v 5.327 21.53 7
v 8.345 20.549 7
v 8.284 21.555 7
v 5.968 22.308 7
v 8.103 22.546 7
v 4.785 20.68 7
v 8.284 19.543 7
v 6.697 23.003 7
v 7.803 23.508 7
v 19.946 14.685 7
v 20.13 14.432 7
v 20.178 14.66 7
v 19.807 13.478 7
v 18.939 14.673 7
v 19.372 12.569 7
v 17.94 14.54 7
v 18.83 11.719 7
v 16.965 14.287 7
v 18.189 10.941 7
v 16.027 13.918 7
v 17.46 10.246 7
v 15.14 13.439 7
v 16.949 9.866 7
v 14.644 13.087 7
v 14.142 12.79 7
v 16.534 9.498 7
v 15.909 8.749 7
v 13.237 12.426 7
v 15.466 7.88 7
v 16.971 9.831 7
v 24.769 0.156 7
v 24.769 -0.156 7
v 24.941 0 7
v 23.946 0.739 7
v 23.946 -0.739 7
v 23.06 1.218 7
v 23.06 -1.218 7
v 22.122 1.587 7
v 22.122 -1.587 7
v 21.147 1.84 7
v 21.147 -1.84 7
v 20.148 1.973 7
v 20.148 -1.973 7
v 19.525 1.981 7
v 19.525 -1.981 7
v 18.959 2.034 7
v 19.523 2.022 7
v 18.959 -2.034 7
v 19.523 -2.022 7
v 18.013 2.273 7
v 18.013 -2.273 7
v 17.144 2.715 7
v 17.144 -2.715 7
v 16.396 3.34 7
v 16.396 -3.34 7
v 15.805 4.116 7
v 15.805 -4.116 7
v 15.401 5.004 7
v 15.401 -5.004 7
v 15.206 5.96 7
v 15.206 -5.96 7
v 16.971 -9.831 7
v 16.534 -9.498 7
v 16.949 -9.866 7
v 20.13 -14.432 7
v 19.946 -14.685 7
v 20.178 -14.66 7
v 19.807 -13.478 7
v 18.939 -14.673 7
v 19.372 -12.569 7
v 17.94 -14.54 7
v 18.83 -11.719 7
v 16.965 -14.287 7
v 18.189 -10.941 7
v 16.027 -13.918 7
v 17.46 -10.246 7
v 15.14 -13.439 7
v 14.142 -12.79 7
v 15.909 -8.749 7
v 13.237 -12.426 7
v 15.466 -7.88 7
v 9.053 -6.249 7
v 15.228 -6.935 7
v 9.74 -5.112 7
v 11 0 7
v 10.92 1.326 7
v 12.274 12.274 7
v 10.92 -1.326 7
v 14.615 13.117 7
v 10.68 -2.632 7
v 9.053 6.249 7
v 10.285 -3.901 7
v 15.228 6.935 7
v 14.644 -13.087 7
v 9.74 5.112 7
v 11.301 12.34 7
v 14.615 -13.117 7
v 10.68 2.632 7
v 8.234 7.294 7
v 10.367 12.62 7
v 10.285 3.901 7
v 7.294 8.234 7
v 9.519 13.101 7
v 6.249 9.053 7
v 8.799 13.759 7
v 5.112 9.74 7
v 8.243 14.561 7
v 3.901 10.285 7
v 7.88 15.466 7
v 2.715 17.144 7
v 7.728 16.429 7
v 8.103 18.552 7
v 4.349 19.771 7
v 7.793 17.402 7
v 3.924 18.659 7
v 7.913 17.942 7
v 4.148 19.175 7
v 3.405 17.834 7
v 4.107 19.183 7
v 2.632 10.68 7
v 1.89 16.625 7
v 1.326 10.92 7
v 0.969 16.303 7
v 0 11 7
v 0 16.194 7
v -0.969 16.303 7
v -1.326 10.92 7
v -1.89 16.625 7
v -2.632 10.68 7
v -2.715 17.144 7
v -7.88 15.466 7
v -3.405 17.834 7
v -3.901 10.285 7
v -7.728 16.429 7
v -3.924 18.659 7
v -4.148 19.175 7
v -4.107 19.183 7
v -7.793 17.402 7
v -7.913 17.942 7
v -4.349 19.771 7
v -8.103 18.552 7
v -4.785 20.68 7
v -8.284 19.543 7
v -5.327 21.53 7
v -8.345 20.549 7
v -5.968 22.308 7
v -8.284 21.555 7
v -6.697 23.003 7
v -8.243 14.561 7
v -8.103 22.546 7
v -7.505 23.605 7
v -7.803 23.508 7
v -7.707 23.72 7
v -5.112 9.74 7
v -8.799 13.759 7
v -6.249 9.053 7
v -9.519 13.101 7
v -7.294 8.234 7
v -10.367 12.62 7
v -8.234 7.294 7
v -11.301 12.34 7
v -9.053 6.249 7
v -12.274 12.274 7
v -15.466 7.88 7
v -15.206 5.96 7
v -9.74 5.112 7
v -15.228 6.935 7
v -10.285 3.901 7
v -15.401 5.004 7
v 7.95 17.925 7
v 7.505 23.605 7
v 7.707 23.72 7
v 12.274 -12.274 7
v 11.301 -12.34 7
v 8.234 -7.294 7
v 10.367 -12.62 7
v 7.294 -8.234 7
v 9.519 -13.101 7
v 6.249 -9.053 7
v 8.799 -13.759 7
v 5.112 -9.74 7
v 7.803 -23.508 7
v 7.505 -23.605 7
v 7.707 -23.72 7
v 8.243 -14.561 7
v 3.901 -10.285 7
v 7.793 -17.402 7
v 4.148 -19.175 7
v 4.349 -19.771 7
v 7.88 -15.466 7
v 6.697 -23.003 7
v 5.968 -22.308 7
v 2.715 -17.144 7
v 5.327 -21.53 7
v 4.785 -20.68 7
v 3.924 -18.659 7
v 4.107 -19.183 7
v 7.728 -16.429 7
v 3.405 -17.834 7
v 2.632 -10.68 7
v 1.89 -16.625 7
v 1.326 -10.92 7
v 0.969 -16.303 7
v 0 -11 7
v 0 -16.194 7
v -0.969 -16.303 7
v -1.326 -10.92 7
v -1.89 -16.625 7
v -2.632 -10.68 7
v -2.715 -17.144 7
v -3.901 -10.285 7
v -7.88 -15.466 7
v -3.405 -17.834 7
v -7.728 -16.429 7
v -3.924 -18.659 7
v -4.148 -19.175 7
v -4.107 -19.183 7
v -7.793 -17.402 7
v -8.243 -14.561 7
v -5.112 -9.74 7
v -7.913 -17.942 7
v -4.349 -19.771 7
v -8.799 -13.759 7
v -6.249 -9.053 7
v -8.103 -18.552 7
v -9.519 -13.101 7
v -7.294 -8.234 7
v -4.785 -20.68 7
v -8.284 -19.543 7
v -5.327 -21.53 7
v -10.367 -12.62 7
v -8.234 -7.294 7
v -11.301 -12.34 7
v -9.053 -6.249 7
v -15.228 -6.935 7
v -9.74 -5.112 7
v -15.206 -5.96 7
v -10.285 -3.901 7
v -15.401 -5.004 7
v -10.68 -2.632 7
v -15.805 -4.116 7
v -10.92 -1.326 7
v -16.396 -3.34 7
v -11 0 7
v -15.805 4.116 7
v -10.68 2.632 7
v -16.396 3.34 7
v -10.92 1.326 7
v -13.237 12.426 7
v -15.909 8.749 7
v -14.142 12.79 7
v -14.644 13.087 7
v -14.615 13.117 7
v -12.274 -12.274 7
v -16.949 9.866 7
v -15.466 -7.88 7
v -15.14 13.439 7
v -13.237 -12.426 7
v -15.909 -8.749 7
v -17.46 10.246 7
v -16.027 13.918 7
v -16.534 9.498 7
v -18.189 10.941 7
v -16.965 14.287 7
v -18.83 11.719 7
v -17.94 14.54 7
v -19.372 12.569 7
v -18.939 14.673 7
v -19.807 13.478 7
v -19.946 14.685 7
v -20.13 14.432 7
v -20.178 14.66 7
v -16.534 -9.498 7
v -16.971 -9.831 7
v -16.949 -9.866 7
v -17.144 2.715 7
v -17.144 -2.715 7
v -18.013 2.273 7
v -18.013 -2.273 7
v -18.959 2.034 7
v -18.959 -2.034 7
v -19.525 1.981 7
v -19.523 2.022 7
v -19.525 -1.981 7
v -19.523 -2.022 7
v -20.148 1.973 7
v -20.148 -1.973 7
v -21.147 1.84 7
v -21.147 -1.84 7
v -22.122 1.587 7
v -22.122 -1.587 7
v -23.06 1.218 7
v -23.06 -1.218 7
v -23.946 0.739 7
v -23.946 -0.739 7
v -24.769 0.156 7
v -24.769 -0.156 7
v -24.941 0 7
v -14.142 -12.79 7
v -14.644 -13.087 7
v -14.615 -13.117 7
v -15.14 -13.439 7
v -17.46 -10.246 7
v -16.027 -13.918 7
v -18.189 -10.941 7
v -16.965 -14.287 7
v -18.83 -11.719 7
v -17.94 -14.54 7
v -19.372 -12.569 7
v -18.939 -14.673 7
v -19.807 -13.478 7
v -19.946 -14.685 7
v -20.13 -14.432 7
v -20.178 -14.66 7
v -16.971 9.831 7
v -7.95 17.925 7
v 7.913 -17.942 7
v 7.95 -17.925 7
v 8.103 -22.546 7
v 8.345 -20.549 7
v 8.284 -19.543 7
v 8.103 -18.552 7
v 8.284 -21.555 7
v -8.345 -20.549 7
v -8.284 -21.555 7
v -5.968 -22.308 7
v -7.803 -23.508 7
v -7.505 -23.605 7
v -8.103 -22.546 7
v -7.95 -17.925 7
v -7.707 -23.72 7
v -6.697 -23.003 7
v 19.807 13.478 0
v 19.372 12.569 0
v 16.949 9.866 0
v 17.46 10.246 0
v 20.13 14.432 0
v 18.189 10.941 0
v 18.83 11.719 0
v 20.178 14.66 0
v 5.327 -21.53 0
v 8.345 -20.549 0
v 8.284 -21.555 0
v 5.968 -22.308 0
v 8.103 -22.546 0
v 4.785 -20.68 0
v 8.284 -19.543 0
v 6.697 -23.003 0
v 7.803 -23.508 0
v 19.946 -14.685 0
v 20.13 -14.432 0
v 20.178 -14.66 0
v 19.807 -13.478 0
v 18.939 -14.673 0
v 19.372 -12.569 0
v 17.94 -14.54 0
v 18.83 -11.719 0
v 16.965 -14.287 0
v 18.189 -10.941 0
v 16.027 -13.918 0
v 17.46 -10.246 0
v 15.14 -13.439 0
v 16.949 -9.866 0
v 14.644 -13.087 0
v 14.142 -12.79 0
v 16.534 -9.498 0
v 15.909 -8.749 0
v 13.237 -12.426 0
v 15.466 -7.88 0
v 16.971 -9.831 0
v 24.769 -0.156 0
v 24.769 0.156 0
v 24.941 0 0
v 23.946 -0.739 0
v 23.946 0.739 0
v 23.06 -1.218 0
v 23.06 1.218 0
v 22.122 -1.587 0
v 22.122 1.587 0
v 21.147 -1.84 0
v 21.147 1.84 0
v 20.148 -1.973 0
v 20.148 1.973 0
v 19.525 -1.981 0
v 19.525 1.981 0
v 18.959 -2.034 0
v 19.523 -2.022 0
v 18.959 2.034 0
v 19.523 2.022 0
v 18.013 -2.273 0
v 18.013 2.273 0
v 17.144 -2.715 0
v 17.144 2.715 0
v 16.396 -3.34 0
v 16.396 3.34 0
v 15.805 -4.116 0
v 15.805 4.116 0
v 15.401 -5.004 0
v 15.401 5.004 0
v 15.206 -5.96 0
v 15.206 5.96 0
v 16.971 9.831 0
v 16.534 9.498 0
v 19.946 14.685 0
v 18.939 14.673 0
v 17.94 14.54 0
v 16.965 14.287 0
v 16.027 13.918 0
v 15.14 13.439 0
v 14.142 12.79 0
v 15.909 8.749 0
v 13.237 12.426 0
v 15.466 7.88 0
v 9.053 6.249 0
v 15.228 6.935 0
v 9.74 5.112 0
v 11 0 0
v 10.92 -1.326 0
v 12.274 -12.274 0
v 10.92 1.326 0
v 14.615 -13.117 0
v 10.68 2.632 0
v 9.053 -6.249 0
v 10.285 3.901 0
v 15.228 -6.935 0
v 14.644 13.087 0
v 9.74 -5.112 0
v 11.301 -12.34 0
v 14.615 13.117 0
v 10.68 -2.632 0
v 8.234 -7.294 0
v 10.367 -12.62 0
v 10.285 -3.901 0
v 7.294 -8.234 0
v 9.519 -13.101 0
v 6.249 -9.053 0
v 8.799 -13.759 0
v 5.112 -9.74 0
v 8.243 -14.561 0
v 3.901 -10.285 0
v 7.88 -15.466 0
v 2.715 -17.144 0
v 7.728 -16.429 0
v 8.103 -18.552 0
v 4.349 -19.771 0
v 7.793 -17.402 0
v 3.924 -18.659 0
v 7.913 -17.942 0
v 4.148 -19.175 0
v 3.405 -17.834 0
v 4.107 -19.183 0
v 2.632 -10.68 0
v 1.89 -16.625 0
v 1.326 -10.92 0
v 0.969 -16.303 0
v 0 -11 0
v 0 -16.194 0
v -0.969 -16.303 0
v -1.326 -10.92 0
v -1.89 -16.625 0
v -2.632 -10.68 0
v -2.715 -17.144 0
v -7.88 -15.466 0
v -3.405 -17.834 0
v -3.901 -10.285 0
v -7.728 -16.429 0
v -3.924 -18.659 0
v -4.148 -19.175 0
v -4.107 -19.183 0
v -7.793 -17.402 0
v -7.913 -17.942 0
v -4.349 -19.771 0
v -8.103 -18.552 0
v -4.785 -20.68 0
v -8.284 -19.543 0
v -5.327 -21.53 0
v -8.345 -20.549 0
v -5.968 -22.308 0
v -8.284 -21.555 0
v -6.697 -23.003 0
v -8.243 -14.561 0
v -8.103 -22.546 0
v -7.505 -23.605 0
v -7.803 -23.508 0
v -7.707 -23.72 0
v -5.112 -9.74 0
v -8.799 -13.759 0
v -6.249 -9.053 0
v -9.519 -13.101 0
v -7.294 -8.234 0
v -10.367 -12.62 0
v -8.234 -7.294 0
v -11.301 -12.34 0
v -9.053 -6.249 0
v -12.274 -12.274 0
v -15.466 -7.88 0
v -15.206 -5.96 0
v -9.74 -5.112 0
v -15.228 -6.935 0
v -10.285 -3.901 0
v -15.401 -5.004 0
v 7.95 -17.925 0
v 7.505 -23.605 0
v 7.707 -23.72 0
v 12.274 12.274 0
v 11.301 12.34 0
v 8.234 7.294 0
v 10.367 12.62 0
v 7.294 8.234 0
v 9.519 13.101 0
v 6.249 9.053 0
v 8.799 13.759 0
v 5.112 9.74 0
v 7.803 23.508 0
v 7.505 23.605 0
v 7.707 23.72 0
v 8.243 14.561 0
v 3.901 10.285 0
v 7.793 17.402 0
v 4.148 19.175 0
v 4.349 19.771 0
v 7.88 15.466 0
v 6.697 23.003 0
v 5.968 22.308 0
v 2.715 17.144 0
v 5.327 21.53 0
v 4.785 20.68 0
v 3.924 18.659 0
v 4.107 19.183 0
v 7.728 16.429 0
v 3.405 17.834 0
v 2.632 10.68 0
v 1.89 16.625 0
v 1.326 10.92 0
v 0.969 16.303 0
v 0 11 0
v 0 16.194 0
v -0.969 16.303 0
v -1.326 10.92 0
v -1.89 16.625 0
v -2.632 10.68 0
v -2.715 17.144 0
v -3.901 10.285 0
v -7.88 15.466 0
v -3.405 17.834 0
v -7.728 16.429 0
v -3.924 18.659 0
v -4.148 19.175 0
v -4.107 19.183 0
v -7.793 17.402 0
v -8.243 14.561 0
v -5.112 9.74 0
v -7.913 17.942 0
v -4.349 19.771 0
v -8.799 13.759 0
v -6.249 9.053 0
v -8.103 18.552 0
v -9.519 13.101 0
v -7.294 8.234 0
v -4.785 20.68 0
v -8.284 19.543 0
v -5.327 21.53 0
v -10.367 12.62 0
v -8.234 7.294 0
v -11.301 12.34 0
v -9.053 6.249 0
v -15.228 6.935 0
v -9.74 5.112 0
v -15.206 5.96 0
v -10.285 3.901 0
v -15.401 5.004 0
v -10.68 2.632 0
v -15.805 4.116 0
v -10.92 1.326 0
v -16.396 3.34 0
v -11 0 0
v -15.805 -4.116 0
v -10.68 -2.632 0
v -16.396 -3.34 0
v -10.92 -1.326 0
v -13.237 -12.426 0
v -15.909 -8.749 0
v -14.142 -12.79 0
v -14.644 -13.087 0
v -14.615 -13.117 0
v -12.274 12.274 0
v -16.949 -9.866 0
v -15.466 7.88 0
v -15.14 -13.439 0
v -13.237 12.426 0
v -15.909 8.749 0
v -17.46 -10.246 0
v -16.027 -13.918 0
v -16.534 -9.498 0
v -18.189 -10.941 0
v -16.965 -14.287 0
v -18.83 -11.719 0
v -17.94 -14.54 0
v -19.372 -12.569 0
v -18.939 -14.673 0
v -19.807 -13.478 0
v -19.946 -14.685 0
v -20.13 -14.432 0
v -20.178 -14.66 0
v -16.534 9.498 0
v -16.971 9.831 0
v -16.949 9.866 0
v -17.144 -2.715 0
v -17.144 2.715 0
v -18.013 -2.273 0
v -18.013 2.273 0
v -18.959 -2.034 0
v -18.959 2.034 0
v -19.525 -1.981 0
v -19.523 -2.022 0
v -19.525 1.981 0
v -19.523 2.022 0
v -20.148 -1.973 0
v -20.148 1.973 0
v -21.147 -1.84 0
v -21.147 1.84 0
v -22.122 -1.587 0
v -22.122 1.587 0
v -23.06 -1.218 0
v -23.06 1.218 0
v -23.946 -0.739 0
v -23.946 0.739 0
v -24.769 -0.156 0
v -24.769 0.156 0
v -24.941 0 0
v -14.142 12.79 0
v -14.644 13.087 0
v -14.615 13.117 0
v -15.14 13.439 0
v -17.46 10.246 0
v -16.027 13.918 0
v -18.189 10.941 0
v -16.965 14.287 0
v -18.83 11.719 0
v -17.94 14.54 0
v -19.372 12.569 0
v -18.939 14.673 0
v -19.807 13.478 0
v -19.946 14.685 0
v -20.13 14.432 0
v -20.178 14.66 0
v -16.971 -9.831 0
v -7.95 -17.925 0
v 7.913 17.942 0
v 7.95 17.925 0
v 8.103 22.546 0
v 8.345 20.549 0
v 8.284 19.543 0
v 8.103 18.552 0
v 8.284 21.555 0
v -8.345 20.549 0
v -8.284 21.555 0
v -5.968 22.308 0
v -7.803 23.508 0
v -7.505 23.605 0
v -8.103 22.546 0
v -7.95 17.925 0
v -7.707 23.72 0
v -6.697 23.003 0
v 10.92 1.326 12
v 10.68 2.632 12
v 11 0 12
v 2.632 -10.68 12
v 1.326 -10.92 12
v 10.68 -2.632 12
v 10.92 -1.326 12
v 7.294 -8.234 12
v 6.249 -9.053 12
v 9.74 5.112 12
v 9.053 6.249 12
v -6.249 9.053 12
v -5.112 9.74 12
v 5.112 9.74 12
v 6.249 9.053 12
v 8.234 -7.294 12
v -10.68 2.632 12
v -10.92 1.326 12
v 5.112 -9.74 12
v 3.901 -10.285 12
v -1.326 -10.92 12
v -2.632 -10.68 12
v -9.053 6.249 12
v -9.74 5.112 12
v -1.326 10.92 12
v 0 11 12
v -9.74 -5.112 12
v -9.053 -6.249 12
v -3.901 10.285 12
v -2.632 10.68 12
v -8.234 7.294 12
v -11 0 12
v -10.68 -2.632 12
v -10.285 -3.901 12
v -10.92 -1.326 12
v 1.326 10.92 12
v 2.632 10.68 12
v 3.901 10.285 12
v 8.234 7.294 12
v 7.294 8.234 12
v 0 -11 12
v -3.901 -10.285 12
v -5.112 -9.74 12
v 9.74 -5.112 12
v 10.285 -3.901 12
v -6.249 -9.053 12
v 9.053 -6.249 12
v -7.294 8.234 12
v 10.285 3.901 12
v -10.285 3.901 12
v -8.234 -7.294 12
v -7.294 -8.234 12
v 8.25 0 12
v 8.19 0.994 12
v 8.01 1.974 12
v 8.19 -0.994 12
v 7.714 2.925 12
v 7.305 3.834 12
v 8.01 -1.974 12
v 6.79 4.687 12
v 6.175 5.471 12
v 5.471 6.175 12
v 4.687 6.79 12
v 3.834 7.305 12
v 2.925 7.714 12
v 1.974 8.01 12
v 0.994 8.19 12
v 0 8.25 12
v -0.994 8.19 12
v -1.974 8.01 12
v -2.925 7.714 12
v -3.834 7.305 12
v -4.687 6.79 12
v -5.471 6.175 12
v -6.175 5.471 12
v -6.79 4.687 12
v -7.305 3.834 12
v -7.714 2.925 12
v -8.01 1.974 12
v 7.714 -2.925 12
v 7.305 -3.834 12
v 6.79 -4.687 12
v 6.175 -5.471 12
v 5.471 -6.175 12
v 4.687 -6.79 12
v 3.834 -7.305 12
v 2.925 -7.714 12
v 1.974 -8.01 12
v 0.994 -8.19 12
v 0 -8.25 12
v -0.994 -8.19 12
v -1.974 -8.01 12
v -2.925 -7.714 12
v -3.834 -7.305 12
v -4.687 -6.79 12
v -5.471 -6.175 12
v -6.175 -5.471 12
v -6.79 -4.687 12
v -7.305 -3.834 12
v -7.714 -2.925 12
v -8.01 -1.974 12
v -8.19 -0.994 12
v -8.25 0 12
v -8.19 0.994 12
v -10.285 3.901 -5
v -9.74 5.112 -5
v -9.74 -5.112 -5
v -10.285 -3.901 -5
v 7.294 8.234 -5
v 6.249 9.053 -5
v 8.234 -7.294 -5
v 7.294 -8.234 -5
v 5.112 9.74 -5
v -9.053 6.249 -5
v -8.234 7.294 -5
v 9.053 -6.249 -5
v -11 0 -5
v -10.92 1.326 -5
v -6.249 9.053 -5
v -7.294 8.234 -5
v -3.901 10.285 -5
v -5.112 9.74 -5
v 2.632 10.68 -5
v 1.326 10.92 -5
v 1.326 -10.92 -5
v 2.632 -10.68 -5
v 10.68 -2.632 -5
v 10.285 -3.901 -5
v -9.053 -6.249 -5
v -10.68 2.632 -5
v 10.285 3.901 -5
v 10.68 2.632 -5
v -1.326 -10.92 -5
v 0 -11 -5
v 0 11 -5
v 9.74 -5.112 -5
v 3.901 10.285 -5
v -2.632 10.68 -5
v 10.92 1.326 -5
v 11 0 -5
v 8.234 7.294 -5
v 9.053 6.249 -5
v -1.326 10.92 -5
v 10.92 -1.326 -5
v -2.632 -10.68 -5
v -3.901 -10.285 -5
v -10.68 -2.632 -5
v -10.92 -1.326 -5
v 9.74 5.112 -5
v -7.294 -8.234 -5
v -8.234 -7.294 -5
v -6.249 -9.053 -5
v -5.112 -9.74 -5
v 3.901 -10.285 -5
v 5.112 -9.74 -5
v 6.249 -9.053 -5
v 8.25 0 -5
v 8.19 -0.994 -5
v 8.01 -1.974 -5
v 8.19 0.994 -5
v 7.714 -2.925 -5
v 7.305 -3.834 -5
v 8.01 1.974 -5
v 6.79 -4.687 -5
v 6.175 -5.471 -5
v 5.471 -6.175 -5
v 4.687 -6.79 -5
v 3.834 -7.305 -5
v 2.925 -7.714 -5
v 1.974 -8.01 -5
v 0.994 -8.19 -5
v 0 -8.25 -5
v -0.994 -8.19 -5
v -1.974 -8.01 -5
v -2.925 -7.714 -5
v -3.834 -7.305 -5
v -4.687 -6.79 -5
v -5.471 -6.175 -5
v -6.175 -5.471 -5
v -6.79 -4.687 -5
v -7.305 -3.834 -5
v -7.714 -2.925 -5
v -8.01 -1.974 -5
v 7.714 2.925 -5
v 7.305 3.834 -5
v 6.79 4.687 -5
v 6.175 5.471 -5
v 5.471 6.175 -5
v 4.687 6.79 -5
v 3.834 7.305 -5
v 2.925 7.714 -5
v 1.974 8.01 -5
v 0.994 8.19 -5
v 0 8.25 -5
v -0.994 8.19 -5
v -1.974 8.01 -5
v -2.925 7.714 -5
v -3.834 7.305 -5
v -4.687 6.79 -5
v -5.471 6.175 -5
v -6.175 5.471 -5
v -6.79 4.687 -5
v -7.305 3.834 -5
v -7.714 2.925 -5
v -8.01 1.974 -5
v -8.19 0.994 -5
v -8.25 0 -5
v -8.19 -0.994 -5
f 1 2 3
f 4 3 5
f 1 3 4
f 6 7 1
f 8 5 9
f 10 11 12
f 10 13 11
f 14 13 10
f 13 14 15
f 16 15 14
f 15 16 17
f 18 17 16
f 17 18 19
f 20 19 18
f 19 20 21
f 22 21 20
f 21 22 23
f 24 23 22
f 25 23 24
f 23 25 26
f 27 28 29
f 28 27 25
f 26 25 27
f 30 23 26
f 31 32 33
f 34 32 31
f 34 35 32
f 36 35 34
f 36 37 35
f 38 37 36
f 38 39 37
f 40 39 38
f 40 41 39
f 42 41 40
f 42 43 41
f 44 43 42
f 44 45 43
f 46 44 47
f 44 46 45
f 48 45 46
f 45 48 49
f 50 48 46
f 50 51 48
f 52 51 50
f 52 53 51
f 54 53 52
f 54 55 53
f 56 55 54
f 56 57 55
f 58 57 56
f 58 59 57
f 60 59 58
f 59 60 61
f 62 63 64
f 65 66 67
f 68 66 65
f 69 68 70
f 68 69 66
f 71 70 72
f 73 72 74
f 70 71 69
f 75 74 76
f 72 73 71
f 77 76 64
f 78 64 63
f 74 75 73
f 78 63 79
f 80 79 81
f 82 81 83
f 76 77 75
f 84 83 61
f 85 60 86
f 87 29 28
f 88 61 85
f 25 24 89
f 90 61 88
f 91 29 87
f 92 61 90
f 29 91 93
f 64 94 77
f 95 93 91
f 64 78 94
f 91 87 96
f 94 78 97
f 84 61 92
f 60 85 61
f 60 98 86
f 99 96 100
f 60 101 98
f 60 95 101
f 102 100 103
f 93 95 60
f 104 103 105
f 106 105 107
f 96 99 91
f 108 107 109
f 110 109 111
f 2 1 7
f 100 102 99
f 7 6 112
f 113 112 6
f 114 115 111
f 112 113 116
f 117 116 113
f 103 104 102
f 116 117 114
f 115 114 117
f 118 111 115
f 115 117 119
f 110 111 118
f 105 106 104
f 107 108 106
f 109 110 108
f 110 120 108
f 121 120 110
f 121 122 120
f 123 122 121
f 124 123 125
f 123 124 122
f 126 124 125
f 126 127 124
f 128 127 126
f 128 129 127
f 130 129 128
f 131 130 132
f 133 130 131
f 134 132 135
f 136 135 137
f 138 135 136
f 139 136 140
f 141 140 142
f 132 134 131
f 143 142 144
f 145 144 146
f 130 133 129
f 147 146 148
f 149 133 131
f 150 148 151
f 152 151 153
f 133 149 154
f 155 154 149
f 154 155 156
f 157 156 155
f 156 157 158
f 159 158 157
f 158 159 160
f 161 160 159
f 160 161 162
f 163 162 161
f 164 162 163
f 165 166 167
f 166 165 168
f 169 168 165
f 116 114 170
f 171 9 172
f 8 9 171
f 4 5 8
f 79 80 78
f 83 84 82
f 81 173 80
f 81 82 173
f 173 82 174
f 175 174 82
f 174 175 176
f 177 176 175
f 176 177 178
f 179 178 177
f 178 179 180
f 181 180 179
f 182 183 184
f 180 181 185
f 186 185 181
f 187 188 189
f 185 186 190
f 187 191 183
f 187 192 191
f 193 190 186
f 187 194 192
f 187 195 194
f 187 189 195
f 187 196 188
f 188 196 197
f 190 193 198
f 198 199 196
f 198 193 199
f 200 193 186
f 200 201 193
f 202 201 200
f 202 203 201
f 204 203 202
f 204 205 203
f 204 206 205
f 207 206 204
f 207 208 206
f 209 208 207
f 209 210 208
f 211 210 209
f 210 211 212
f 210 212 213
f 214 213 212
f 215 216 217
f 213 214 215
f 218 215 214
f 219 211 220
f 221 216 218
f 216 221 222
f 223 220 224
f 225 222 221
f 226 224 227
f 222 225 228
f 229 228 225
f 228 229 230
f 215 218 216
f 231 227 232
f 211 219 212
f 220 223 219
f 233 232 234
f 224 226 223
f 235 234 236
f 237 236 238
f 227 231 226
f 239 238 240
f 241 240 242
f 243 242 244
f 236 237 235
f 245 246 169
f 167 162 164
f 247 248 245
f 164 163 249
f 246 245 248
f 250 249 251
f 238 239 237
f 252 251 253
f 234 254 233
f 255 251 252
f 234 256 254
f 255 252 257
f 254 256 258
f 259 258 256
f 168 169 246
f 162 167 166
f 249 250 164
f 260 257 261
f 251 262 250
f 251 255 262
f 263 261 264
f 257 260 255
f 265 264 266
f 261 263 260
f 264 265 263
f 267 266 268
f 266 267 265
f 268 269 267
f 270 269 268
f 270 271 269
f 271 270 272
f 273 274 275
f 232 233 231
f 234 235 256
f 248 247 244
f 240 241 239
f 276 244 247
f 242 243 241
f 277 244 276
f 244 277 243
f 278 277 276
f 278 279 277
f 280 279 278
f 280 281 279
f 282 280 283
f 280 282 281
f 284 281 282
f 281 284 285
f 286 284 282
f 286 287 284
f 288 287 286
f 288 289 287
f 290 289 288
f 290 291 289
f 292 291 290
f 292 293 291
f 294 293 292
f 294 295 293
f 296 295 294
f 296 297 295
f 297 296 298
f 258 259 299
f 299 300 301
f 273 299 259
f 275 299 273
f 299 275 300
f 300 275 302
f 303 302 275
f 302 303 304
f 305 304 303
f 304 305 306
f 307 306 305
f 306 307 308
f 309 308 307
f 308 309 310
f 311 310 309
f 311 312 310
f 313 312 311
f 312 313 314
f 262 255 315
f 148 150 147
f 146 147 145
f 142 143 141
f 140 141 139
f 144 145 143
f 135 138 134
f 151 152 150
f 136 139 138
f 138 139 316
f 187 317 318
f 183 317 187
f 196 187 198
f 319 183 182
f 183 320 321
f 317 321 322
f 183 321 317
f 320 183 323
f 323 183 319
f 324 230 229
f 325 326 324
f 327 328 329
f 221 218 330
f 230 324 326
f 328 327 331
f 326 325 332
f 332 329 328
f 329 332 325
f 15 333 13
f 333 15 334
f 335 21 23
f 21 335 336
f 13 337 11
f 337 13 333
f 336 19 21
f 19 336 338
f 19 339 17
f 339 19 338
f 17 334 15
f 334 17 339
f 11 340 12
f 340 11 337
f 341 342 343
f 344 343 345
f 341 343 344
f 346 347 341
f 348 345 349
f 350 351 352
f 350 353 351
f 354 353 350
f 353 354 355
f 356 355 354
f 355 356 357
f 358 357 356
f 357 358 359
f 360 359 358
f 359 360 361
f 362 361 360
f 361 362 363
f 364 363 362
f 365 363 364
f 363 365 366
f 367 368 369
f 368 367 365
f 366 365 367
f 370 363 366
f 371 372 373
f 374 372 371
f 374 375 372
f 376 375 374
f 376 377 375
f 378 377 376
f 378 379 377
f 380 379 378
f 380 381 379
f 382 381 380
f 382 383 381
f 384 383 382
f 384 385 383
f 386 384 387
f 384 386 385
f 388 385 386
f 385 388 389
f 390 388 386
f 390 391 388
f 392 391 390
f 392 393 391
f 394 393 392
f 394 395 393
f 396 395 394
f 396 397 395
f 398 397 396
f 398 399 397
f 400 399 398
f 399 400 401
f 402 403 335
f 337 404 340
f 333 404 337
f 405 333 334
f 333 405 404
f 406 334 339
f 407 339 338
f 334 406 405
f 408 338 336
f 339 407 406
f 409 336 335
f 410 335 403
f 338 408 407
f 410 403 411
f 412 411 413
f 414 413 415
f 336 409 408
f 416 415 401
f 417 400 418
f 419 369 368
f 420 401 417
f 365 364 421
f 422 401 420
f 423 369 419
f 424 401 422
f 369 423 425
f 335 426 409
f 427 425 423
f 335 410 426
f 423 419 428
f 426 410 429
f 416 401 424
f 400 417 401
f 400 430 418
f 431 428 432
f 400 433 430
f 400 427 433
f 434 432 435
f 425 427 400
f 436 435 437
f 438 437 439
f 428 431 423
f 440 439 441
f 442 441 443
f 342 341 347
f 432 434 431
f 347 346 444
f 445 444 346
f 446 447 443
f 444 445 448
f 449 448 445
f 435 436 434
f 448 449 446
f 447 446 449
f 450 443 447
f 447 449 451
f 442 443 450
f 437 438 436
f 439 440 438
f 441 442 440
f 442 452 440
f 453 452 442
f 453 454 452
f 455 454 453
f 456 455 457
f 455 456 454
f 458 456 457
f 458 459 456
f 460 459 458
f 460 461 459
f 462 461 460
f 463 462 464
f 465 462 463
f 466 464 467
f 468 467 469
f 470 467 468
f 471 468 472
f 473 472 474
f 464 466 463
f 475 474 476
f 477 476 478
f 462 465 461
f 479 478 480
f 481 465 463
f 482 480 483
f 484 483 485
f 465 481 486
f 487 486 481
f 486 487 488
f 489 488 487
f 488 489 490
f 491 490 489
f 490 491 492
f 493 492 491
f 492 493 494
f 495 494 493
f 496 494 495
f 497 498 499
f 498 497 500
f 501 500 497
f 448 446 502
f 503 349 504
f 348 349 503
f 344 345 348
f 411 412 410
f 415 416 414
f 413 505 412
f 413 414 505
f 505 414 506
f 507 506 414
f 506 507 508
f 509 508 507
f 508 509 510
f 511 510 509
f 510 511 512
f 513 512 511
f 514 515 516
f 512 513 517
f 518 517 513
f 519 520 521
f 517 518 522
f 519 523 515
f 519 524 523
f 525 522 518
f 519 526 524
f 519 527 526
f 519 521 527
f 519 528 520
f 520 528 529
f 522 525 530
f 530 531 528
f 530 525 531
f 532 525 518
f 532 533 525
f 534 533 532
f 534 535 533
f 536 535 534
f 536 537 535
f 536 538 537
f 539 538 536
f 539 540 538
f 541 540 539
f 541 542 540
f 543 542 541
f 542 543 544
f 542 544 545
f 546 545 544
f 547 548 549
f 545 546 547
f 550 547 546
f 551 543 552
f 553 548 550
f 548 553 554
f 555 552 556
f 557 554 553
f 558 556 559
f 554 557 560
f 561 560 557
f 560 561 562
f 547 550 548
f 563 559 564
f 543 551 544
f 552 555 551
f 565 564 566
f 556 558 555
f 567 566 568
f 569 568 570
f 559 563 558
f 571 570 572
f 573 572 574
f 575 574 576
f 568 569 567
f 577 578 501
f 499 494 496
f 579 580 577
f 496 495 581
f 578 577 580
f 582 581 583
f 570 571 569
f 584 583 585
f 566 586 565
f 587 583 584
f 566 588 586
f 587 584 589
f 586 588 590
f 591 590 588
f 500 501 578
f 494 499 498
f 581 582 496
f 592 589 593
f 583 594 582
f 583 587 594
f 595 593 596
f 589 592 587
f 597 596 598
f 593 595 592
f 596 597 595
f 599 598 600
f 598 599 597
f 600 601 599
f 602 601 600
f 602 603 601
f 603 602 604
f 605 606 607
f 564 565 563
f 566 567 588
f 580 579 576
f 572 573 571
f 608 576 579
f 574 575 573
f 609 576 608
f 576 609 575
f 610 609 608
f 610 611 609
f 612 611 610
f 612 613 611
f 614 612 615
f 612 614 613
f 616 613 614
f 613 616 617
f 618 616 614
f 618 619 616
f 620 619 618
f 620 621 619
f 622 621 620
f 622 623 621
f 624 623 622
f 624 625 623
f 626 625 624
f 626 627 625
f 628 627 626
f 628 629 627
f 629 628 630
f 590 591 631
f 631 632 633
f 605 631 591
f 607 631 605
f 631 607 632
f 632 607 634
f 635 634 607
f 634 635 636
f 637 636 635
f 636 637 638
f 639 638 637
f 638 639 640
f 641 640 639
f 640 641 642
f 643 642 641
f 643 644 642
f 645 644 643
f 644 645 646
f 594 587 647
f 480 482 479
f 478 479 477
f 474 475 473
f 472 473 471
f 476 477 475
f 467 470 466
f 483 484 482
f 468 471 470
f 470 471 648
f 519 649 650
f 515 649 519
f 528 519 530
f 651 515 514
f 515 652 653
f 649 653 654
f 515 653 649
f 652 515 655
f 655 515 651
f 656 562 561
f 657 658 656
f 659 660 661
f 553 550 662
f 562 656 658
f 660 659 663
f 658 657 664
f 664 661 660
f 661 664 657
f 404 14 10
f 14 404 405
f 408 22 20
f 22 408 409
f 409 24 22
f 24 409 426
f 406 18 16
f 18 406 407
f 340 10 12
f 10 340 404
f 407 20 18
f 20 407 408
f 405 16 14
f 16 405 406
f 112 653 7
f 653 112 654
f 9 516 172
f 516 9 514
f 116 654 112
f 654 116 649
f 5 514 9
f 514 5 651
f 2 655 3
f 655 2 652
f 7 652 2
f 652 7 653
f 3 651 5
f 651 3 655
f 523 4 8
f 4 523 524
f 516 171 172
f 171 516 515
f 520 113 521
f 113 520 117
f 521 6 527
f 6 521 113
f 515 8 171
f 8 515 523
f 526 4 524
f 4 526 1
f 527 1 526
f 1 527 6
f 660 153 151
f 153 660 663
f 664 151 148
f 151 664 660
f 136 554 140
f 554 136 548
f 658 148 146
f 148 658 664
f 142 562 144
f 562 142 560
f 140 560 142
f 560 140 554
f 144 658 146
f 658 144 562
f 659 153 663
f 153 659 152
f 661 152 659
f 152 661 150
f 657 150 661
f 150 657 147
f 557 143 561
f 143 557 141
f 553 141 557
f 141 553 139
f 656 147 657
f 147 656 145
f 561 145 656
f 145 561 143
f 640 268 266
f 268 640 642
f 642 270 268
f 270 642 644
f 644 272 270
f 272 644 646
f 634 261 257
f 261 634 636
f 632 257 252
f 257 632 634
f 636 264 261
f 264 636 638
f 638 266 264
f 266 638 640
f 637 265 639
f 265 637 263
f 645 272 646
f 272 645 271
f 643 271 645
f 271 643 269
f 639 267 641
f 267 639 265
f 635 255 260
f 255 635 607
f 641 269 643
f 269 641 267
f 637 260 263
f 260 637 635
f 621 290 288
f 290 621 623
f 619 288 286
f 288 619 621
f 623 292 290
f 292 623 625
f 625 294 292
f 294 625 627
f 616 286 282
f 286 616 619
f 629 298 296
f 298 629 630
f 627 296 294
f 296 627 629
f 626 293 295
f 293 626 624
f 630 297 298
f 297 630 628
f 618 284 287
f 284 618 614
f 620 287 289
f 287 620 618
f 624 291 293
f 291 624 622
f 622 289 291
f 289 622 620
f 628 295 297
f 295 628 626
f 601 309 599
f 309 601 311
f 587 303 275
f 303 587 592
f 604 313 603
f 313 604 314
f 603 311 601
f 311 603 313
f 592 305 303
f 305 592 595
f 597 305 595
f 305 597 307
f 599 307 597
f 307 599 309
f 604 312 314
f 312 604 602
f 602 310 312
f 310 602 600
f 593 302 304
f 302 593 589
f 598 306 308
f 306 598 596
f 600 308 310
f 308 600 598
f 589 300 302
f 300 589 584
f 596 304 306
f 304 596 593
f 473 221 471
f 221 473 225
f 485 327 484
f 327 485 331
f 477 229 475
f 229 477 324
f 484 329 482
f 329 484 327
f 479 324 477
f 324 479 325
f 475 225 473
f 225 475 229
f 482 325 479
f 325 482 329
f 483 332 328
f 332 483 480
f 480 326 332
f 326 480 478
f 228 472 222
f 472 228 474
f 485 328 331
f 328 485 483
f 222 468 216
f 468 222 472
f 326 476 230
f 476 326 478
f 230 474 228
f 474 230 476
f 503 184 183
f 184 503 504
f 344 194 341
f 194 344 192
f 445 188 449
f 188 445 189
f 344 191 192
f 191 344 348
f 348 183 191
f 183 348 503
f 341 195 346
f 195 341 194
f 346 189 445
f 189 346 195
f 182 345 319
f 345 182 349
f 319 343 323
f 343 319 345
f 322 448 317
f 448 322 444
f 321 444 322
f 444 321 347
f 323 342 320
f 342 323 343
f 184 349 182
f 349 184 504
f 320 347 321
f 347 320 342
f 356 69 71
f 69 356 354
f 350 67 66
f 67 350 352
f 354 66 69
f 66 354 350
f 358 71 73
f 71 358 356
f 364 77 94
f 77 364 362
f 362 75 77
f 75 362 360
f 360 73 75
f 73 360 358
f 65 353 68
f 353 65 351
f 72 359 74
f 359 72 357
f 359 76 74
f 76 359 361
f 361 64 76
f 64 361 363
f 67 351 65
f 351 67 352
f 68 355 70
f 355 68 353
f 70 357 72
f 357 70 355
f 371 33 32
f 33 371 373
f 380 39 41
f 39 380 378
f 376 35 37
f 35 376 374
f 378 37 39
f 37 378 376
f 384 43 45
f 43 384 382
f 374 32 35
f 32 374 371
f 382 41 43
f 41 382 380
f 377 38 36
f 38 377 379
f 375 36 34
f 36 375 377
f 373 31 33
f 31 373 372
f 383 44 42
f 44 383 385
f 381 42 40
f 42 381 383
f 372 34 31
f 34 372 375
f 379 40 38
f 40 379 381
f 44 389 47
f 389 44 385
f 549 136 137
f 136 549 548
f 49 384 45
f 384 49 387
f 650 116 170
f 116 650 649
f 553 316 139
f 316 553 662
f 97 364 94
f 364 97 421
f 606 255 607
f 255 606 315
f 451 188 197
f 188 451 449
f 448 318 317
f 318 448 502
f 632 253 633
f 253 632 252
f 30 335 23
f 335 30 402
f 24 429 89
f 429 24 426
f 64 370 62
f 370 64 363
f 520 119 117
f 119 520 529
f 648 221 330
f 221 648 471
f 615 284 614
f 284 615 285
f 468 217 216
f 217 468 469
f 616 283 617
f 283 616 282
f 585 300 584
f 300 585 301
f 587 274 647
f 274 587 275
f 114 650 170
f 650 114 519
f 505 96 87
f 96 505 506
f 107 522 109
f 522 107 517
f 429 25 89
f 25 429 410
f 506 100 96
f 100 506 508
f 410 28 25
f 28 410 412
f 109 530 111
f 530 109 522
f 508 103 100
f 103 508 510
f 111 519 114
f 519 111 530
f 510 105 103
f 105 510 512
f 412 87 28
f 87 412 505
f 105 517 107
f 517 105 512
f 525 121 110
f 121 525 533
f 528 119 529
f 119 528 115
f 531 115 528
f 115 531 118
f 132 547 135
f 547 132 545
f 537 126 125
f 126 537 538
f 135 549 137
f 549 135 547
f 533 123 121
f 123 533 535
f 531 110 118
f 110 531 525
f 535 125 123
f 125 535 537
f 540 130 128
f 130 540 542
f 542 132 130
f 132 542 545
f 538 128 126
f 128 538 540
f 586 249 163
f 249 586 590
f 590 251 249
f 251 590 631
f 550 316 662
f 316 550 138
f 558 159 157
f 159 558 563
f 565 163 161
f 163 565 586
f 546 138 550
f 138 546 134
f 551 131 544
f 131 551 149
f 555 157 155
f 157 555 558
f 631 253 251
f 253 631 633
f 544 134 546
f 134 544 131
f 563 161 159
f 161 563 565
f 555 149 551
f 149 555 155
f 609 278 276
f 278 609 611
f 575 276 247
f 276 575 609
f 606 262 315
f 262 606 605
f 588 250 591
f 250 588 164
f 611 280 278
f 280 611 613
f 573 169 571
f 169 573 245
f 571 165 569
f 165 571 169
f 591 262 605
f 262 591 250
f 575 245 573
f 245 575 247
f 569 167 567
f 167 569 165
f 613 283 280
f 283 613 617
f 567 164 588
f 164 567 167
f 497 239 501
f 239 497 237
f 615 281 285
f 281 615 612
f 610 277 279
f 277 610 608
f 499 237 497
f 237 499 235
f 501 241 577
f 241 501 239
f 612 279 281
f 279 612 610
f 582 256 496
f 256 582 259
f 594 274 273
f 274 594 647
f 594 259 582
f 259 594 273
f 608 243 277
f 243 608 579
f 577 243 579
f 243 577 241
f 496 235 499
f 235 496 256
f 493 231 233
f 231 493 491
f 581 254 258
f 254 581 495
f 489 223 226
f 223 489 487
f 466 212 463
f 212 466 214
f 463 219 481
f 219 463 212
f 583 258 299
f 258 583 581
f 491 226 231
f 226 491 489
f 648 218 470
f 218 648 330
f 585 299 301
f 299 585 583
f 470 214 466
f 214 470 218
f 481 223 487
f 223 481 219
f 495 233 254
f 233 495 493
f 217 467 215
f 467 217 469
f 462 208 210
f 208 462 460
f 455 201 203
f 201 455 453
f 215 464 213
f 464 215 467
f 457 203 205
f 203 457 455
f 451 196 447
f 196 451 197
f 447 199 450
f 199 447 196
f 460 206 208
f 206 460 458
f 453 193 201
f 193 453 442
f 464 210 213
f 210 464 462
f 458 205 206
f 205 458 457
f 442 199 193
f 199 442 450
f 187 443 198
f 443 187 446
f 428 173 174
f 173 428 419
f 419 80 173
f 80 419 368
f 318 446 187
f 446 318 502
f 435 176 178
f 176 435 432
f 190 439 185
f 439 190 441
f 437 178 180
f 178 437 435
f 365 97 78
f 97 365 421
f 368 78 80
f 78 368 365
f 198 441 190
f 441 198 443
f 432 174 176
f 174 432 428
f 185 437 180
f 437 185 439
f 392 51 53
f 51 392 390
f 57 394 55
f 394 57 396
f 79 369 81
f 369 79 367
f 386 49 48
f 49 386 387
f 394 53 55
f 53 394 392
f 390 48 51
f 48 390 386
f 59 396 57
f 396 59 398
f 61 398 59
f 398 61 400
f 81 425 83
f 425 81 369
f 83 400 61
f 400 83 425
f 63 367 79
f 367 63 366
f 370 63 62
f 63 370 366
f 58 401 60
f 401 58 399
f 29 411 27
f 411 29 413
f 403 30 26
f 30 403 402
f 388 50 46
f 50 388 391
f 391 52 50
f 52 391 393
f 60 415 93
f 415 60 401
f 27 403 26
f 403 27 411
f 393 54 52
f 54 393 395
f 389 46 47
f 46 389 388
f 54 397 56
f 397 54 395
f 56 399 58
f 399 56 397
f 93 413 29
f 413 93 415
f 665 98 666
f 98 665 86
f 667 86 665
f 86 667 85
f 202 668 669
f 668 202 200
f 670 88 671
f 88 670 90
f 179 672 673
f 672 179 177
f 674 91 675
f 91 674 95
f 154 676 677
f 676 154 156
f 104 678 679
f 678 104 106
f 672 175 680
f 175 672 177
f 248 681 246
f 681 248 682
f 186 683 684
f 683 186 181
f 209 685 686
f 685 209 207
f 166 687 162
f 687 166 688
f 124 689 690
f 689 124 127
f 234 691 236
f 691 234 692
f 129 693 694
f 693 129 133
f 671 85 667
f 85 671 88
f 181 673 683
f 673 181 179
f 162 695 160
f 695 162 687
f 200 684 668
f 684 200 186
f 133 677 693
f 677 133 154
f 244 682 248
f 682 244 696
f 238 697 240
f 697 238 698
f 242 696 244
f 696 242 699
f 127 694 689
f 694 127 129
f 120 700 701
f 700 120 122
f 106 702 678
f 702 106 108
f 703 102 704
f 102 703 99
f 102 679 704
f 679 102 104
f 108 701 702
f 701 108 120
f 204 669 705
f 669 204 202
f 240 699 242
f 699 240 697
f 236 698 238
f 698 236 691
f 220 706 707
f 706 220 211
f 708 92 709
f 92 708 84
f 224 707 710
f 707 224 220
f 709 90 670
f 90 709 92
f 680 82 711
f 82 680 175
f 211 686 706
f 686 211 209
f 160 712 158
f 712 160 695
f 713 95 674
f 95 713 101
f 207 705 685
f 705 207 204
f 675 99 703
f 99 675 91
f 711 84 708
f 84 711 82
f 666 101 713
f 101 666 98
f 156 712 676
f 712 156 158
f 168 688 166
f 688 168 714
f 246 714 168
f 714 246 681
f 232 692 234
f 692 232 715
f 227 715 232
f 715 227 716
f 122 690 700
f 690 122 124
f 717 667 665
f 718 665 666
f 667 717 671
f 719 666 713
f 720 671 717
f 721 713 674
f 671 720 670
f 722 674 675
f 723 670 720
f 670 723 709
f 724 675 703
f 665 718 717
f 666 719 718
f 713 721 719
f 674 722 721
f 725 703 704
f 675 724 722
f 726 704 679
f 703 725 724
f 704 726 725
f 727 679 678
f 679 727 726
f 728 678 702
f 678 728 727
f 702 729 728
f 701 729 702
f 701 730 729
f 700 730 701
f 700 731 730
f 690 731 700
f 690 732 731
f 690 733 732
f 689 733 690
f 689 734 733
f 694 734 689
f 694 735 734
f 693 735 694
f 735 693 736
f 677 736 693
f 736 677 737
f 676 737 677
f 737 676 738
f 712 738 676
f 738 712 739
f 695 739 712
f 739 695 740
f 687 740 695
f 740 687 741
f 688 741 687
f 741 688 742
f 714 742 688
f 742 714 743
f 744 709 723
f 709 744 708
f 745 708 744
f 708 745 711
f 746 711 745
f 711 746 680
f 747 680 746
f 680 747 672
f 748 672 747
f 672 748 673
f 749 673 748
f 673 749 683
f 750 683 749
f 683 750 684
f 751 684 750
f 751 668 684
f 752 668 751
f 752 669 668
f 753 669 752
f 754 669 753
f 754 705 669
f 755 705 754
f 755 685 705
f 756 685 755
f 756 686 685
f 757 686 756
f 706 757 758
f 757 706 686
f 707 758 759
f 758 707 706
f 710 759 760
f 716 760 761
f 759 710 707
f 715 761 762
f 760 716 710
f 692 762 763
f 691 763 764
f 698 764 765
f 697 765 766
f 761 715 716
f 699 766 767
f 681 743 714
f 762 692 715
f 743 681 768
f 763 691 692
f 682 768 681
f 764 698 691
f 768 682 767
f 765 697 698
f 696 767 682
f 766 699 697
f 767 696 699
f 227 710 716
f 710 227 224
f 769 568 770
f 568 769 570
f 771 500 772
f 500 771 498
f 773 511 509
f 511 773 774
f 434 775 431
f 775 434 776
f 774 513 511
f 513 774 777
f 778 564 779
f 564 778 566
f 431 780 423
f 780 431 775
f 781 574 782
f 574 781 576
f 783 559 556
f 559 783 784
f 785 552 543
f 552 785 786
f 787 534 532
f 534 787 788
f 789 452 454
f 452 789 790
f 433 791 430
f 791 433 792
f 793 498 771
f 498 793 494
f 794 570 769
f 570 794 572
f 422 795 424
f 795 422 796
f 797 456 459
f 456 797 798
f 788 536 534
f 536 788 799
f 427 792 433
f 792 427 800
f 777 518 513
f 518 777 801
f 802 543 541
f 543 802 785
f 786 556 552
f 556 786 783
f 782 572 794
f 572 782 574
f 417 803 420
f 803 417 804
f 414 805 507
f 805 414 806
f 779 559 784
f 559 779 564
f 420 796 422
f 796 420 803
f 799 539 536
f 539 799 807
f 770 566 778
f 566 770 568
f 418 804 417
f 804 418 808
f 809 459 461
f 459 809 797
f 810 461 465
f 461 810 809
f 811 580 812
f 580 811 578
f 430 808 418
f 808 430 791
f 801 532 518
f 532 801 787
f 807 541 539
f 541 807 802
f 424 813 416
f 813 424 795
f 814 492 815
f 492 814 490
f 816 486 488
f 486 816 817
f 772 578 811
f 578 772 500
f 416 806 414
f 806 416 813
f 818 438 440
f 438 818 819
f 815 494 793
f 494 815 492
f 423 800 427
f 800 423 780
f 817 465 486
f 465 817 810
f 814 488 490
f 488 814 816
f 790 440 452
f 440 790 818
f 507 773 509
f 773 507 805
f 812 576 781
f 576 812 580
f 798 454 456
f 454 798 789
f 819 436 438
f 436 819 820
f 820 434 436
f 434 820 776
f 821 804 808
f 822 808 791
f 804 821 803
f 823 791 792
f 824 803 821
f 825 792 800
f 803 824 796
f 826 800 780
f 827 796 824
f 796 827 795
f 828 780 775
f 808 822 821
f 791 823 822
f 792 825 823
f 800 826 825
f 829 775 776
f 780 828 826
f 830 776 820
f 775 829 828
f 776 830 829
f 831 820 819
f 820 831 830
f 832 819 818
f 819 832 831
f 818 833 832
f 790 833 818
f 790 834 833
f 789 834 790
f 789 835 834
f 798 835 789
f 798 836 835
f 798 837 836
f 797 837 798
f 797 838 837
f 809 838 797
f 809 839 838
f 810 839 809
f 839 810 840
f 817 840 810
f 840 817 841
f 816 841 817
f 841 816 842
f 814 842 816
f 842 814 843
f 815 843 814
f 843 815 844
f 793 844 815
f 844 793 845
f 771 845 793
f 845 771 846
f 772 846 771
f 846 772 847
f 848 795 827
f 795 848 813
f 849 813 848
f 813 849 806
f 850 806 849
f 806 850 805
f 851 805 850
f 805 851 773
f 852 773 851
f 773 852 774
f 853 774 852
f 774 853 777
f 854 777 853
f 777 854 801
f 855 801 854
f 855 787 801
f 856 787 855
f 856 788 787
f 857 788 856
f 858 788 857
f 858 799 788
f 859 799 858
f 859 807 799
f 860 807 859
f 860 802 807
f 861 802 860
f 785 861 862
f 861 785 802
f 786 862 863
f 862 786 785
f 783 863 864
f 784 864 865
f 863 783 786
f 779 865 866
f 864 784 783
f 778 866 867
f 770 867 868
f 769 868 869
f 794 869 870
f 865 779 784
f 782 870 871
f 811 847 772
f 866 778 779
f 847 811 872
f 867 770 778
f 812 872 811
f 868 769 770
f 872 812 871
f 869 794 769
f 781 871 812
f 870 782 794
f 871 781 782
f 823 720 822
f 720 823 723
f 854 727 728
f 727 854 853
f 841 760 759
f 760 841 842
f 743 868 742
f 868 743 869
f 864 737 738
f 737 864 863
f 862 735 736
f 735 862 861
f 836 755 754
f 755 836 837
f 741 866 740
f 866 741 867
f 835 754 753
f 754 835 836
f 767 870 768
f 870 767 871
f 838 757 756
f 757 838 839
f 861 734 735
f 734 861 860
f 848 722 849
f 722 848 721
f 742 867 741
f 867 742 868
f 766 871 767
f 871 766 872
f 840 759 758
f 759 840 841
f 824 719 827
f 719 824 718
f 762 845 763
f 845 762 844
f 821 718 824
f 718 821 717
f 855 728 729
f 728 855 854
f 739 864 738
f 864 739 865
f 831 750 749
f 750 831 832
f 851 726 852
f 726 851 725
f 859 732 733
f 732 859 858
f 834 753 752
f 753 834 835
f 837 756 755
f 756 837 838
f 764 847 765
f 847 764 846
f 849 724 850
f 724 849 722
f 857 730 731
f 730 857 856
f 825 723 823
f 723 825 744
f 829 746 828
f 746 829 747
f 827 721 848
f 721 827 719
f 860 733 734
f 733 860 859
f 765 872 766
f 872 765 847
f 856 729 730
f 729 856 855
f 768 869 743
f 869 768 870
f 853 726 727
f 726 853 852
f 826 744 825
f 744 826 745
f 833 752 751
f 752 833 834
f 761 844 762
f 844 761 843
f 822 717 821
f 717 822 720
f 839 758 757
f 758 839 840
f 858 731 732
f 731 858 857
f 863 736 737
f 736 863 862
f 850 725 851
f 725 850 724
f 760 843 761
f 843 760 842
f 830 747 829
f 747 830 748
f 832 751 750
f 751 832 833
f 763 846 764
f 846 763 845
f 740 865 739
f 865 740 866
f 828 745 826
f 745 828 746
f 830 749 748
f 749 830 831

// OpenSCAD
// Sprocket generator v1

/* [Sprocket] */

// Example for 08B roller chain
teeth=10;
roller_d=8.51;
thickness=7.0; // 7.75 original 08B
pitch=12.70; // 12.7
tolerance=0.1;

/* [Shaft] */
shaft_d=22;
hole_d=16.5;
top_h=5;
bot_h=5;

/* [FS, FA] */
fs = 1;
fa = 7;

module sprocket(teeth=20, roller=3, pitch=17, thickness=3, tolerance=0.2){
	roller=roller/2; //We need radius in our calculations, not diameter
	distance_from_center=pitch/(2*sin(180/teeth));
	echo(distance_from_center);
	angle=(360/teeth);
	
    pitch_circle=sqrt((distance_from_center*distance_from_center) - (pitch*(roller+tolerance))+((roller+tolerance)*(roller+tolerance)));
	
    echo(pitch_circle);    
    
    difference(){
		union(){
            $fs=fs; 
            $fa=fa;
			cylinder(r=pitch_circle,h=thickness);
			for(tooth=[1:teeth]){
				intersection(){
					rotate(a=[0,0,angle*(tooth+0.5)]){
						translate([distance_from_center,0,0]){
                            $fs=fs; 
                            $fa=fa;
							cylinder(r=pitch-roller-tolerance,h=thickness);
						}
					}
					rotate(a=[0,0,angle*(tooth-0.5)]){
						translate([distance_from_center,0,0]){
							cylinder(r=pitch-roller-tolerance,h=thickness);
						}
					}
				}
			}
		}
		for(tooth=[1:teeth]){
			rotate(a=[0,0,angle*(tooth+0.5)]){
				translate([distance_from_center,0,-1]){
					$fs=fs; 
                    $fa=fa;
                    cylinder(r=roller+tolerance,h=thickness+2);
				}
			}
		}
	}
}

difference(){
    union(){
        sprocket(teeth,roller_d,pitch,thickness,tolerance);
        translate([0,0,thickness])
            cylinder(top_h,shaft_d/2,shaft_d/2,$fs=fs, $fa=fa); // TOP
        rotate([0,180])
            cylinder(bot_h,shaft_d/2,shaft_d/2,$fs=fs, $fa=fa); // BOT
    }
    translate([0,0,-bot_h-1]){ // Added -1 to make clean hole        
        cylinder(bot_h+thickness+top_h+2,hole_d/2,hole_d/2,$fs=fs, $fa=fa);
    }
}
